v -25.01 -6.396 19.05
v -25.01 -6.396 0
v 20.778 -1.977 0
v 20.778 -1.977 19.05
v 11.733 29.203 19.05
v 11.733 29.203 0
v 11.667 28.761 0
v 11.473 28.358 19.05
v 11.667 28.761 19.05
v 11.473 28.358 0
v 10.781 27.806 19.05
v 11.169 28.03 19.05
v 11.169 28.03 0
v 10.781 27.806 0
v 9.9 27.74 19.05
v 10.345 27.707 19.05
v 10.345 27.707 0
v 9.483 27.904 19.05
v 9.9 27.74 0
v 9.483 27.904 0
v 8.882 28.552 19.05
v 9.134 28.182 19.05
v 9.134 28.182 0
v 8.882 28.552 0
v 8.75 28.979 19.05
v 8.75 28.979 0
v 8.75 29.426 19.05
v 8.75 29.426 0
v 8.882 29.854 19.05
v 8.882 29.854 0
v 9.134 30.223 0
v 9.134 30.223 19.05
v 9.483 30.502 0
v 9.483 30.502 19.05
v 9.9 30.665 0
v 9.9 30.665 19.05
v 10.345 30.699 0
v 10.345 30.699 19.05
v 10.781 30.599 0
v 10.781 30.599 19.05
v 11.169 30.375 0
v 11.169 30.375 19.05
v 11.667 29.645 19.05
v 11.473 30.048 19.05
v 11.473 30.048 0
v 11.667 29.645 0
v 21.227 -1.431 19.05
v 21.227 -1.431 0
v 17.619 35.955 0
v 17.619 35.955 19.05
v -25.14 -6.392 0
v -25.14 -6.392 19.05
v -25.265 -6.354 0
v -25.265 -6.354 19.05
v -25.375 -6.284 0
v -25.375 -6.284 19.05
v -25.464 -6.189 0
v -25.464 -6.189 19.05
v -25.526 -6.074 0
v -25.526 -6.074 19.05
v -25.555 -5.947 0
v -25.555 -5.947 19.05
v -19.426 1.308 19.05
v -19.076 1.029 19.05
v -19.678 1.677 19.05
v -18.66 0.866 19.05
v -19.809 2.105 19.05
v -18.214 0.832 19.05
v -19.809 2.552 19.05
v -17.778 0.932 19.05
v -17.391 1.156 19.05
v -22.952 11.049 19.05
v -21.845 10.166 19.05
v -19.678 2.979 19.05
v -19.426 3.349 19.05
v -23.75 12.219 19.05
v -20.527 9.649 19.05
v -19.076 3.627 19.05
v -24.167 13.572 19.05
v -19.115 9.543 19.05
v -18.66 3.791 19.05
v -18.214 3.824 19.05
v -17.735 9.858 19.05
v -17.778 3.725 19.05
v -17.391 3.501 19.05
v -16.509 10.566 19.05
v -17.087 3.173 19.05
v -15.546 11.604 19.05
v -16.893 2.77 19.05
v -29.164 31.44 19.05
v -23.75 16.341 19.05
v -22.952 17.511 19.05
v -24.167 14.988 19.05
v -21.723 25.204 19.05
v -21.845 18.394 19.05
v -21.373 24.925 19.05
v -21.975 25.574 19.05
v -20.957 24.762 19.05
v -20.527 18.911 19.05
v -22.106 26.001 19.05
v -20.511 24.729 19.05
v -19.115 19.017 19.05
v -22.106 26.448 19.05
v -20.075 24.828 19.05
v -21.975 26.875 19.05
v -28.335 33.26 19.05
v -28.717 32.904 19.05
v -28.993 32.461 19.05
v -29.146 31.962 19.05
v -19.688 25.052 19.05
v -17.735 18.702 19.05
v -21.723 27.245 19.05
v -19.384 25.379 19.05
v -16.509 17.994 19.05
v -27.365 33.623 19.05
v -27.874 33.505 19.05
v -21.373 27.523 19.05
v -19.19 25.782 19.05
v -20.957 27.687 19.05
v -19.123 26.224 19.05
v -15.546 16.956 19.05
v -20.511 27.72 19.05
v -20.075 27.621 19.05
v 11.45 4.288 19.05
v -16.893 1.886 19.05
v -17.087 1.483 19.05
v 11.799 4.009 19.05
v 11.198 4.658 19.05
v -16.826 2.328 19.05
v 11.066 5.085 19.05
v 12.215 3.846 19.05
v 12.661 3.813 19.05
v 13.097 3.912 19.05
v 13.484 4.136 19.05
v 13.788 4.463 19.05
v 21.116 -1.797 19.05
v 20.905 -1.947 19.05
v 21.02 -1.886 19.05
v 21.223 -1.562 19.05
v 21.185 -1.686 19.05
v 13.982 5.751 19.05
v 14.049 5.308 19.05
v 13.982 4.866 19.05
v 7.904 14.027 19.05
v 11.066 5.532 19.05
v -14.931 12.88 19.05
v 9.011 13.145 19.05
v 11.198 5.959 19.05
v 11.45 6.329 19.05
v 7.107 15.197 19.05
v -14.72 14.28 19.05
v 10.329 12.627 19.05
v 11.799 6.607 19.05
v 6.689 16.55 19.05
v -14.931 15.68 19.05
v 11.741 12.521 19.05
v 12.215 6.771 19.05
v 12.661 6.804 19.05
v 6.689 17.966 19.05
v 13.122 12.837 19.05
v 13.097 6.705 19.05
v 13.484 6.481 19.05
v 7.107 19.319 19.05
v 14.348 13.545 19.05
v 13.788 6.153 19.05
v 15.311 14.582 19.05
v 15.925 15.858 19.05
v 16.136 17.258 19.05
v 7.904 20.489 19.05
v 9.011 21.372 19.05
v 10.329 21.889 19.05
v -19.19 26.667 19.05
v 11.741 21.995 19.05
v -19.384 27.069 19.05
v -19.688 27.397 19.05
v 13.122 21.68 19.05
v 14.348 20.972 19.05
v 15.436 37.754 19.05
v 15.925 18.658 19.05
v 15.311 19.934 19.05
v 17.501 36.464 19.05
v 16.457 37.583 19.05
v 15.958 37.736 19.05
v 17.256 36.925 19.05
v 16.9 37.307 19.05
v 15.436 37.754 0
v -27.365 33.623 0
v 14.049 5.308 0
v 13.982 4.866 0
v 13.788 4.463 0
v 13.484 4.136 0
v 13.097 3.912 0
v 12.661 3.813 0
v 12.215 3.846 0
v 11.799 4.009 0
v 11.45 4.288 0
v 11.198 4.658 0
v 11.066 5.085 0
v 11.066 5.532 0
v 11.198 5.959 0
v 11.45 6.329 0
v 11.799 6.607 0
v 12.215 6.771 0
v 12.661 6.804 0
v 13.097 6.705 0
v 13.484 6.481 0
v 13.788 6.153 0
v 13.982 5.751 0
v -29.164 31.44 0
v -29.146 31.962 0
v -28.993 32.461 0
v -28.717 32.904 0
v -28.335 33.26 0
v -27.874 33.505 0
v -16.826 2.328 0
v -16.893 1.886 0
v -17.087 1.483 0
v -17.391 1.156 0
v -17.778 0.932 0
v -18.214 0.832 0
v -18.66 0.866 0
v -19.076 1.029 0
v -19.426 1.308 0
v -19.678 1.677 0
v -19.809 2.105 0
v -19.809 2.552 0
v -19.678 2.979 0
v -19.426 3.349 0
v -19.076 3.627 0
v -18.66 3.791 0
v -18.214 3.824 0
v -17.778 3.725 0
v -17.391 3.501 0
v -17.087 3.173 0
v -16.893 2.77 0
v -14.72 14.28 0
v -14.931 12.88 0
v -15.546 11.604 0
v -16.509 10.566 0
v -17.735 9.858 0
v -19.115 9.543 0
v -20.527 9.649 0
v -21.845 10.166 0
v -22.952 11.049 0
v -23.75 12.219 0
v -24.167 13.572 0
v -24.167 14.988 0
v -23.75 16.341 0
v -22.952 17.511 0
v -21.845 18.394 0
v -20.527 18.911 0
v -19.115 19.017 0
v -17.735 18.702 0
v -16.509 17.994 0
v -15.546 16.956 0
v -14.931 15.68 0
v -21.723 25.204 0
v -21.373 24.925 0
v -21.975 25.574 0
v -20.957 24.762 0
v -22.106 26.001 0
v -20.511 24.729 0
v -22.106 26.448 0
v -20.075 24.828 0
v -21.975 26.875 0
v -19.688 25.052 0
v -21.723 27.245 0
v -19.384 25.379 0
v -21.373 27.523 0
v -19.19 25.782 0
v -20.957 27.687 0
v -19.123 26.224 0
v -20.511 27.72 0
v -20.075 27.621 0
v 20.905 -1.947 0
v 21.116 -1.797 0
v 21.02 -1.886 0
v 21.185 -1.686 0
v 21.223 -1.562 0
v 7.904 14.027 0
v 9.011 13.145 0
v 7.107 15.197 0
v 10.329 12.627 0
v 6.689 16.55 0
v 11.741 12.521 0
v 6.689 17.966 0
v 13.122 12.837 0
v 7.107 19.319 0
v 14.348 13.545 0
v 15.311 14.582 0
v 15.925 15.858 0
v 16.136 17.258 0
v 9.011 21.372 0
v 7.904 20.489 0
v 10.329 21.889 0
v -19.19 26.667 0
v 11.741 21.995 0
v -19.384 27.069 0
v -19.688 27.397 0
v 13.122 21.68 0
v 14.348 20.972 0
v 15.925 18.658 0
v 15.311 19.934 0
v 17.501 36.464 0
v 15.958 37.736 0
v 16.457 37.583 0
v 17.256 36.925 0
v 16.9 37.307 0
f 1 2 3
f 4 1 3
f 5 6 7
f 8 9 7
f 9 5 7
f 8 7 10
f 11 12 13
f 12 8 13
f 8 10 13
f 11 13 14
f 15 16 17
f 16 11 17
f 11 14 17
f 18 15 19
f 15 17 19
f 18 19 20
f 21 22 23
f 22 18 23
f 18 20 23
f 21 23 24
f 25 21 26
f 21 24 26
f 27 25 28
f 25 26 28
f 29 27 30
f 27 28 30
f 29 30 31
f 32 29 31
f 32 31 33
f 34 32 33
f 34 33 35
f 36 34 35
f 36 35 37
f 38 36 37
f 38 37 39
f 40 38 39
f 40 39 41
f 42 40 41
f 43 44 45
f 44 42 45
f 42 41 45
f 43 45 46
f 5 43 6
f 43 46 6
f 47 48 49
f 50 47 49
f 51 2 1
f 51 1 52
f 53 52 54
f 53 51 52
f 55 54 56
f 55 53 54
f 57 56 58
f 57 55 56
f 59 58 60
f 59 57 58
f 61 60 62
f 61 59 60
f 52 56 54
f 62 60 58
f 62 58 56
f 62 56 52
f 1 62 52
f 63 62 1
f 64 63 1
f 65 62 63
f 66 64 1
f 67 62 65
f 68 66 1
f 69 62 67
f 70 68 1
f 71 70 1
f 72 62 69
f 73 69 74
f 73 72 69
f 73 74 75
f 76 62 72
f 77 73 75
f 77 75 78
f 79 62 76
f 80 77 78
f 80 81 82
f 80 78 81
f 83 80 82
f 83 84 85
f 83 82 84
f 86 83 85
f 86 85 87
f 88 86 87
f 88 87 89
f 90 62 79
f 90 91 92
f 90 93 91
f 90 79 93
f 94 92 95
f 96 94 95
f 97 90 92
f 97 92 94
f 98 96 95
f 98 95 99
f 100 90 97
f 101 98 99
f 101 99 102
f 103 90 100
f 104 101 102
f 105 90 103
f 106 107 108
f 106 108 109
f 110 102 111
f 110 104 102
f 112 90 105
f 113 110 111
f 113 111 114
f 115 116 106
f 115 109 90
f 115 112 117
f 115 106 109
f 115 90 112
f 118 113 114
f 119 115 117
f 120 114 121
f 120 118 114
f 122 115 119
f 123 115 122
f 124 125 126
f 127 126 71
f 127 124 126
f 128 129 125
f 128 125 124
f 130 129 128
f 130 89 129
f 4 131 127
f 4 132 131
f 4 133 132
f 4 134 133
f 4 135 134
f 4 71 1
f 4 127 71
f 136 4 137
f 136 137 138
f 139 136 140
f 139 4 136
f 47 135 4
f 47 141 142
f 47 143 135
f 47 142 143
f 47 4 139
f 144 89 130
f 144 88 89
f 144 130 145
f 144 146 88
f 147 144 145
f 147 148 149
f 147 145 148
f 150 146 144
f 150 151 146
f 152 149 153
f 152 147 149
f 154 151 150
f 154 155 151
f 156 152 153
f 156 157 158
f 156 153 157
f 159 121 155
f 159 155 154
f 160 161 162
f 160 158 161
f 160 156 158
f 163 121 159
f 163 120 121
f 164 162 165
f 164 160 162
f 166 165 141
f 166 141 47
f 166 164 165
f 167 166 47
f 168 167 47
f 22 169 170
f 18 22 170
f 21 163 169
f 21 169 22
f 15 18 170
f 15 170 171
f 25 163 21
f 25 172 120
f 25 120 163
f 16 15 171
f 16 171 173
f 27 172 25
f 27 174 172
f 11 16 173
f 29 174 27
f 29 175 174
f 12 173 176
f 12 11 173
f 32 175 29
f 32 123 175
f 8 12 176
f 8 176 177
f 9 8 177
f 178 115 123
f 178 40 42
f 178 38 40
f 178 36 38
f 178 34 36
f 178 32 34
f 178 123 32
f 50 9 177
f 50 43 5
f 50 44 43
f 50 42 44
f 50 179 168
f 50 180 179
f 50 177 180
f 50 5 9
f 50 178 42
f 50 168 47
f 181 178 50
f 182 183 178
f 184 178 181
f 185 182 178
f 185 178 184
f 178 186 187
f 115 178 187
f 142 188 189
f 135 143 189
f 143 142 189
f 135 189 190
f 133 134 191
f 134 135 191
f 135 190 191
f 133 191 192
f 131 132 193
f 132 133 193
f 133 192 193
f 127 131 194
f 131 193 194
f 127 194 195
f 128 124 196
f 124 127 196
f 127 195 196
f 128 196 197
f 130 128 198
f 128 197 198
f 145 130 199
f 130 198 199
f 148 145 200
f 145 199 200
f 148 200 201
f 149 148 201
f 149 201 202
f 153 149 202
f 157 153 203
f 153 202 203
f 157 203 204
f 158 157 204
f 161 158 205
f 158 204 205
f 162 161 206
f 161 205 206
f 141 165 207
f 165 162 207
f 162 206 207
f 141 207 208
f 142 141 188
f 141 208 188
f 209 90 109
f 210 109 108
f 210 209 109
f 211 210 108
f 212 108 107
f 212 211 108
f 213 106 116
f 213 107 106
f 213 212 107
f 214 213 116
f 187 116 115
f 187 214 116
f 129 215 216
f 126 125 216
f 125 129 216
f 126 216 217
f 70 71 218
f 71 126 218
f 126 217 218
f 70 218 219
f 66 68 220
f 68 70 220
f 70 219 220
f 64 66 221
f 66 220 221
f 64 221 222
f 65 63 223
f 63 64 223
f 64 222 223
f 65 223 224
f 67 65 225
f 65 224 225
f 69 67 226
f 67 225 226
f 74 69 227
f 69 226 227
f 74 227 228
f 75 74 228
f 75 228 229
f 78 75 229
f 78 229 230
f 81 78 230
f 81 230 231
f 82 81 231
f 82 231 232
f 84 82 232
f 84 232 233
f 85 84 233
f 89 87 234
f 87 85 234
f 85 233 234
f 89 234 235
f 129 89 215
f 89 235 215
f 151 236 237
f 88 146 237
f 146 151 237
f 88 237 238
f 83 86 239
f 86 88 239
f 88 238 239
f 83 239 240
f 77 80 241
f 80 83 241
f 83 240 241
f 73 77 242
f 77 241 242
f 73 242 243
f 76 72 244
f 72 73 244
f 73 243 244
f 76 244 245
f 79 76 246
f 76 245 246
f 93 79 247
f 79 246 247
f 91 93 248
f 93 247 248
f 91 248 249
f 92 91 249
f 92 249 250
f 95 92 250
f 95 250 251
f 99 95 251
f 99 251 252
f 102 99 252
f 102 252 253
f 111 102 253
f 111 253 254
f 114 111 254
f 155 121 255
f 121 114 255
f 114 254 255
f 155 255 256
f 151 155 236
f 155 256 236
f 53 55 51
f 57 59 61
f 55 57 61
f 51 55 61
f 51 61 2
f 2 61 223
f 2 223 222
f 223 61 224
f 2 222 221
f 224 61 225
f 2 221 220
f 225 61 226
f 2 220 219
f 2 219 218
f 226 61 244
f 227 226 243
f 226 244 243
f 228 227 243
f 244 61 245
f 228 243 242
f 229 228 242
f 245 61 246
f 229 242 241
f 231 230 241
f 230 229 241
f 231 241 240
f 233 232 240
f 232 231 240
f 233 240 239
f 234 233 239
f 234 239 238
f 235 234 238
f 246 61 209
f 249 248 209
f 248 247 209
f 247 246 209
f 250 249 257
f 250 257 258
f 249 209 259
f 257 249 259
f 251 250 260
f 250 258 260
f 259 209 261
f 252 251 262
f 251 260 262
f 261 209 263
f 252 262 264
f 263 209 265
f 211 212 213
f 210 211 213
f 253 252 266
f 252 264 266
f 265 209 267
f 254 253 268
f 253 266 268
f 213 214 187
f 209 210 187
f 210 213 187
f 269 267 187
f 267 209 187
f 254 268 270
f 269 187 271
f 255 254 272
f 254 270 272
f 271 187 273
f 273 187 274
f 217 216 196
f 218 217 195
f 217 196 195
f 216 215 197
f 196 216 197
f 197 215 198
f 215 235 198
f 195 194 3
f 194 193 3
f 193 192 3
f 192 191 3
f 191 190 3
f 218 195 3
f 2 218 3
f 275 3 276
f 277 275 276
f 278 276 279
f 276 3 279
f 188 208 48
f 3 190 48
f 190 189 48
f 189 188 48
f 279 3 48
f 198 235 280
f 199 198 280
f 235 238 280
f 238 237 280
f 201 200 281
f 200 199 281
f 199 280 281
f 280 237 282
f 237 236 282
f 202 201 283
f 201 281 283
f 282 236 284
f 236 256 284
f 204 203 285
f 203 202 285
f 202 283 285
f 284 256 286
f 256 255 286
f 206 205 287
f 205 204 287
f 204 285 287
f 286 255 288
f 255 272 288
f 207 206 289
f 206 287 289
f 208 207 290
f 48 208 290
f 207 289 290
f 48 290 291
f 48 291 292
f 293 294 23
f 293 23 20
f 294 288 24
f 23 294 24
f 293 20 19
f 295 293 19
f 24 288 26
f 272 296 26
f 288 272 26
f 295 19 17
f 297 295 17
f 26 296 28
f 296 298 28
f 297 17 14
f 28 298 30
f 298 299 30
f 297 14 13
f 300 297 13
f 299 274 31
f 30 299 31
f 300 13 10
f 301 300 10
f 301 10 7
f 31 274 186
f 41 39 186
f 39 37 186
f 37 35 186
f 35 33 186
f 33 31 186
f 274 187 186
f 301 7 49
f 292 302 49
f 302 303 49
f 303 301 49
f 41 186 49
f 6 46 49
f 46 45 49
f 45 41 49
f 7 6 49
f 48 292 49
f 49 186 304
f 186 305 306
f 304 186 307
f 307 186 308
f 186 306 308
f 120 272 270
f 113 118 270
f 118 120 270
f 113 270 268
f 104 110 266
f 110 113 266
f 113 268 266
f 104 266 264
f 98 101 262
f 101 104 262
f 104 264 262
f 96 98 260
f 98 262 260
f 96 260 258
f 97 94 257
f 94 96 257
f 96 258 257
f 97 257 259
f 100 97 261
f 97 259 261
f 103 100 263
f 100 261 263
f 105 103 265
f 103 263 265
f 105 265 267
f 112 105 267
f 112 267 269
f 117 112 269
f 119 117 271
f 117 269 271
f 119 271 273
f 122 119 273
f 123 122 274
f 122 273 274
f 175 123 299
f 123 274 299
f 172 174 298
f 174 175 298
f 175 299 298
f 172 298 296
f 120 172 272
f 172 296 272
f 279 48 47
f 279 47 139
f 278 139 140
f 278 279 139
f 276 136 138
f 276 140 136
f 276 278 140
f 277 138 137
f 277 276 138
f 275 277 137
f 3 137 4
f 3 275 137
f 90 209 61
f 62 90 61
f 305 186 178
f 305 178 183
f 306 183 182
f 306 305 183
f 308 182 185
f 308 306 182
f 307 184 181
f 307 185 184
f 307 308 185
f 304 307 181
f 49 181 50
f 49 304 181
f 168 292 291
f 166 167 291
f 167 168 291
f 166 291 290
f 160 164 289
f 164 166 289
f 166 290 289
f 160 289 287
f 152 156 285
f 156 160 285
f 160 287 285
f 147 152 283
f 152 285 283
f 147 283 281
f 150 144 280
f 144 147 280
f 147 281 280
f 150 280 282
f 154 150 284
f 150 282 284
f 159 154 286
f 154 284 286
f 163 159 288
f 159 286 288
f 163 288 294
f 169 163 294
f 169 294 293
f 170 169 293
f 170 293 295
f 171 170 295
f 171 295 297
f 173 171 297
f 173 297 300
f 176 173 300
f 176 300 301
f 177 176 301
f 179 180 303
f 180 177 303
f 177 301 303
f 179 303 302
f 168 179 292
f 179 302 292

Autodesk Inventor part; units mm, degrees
ref_plane "YZ Plane" through (0, 0, 0) normal (1, 0, 0) x (0, 1, 0)
ref_plane "XZ Plane" through (0, 0, 0) normal (0, 1, 0) x (-1, 0, 0)
ref_plane "XY Plane" through (0, 0, 0) normal (0, 0, 1) x (1, 0, 0)
sketch "Sketch1" plane through (0, 0, 0) normal (0, 0, 1) x (1, 0, 0)
  arc A0 (17.6188, 35.9553) -> (15.4359, 37.7539) centre (15.6281, 35.7632) ccw projected
  line L0 (15.4359, 37.7539) -> (-27.3652, 33.6227) projected
  arc A1 (-27.3652, 33.6227) -> (-29.1638, 31.4398) centre (-27.173, 31.6319) ccw projected
  line L1 (-29.1638, 31.4398) -> (-25.5552, -5.9466) projected
  arc A2 (-25.5552, -5.9466) -> (-25.0095, -6.3962) centre (-25.0575, -5.8985) ccw projected
  line L2 (-25.0095, -6.3962) -> (20.7777, -1.9768) projected
  arc A3 (20.7777, -1.9768) -> (21.2274, -1.4311) centre (20.7297, -1.4791) ccw projected
  line L3 (21.2274, -1.4311) -> (17.6188, 35.9553) projected
  circle A4 centre (-19.4703, 14.2799) radius 4.75 projected
  circle A5 centre (11.3863, 17.2582) radius 4.75 projected
  circle A6 centre (-18.3261, 2.3283) radius 1.25 projected
  circle A7 centre (10.2334, 29.2027) radius 1.25 projected
  circle A8 centre (-20.6232, 26.2244) radius 1.25 projected
  circle A9 centre (12.5491, 5.3084) radius 1.25 projected
  circle A10 centre (-18.3261, 2.3283) radius 1.5
  circle A11 centre (12.5491, 5.3084) radius 1.5
  circle A12 centre (10.2334, 29.2027) radius 1.5
  circle A13 centre (-20.6232, 26.2244) radius 1.5
  point P0 (0, 0)
  dimension "d0" = 3
  dimension "d1" = 3
  dimension "d3" = 3
  dimension "d6" = 3
extrude "Extrusion1" add sketch "Sketch1" along normal blind 19.05 contours L3 A3 L2 A2 L1 A1 L0 A0
properties part number "Head Spacer Plate"
